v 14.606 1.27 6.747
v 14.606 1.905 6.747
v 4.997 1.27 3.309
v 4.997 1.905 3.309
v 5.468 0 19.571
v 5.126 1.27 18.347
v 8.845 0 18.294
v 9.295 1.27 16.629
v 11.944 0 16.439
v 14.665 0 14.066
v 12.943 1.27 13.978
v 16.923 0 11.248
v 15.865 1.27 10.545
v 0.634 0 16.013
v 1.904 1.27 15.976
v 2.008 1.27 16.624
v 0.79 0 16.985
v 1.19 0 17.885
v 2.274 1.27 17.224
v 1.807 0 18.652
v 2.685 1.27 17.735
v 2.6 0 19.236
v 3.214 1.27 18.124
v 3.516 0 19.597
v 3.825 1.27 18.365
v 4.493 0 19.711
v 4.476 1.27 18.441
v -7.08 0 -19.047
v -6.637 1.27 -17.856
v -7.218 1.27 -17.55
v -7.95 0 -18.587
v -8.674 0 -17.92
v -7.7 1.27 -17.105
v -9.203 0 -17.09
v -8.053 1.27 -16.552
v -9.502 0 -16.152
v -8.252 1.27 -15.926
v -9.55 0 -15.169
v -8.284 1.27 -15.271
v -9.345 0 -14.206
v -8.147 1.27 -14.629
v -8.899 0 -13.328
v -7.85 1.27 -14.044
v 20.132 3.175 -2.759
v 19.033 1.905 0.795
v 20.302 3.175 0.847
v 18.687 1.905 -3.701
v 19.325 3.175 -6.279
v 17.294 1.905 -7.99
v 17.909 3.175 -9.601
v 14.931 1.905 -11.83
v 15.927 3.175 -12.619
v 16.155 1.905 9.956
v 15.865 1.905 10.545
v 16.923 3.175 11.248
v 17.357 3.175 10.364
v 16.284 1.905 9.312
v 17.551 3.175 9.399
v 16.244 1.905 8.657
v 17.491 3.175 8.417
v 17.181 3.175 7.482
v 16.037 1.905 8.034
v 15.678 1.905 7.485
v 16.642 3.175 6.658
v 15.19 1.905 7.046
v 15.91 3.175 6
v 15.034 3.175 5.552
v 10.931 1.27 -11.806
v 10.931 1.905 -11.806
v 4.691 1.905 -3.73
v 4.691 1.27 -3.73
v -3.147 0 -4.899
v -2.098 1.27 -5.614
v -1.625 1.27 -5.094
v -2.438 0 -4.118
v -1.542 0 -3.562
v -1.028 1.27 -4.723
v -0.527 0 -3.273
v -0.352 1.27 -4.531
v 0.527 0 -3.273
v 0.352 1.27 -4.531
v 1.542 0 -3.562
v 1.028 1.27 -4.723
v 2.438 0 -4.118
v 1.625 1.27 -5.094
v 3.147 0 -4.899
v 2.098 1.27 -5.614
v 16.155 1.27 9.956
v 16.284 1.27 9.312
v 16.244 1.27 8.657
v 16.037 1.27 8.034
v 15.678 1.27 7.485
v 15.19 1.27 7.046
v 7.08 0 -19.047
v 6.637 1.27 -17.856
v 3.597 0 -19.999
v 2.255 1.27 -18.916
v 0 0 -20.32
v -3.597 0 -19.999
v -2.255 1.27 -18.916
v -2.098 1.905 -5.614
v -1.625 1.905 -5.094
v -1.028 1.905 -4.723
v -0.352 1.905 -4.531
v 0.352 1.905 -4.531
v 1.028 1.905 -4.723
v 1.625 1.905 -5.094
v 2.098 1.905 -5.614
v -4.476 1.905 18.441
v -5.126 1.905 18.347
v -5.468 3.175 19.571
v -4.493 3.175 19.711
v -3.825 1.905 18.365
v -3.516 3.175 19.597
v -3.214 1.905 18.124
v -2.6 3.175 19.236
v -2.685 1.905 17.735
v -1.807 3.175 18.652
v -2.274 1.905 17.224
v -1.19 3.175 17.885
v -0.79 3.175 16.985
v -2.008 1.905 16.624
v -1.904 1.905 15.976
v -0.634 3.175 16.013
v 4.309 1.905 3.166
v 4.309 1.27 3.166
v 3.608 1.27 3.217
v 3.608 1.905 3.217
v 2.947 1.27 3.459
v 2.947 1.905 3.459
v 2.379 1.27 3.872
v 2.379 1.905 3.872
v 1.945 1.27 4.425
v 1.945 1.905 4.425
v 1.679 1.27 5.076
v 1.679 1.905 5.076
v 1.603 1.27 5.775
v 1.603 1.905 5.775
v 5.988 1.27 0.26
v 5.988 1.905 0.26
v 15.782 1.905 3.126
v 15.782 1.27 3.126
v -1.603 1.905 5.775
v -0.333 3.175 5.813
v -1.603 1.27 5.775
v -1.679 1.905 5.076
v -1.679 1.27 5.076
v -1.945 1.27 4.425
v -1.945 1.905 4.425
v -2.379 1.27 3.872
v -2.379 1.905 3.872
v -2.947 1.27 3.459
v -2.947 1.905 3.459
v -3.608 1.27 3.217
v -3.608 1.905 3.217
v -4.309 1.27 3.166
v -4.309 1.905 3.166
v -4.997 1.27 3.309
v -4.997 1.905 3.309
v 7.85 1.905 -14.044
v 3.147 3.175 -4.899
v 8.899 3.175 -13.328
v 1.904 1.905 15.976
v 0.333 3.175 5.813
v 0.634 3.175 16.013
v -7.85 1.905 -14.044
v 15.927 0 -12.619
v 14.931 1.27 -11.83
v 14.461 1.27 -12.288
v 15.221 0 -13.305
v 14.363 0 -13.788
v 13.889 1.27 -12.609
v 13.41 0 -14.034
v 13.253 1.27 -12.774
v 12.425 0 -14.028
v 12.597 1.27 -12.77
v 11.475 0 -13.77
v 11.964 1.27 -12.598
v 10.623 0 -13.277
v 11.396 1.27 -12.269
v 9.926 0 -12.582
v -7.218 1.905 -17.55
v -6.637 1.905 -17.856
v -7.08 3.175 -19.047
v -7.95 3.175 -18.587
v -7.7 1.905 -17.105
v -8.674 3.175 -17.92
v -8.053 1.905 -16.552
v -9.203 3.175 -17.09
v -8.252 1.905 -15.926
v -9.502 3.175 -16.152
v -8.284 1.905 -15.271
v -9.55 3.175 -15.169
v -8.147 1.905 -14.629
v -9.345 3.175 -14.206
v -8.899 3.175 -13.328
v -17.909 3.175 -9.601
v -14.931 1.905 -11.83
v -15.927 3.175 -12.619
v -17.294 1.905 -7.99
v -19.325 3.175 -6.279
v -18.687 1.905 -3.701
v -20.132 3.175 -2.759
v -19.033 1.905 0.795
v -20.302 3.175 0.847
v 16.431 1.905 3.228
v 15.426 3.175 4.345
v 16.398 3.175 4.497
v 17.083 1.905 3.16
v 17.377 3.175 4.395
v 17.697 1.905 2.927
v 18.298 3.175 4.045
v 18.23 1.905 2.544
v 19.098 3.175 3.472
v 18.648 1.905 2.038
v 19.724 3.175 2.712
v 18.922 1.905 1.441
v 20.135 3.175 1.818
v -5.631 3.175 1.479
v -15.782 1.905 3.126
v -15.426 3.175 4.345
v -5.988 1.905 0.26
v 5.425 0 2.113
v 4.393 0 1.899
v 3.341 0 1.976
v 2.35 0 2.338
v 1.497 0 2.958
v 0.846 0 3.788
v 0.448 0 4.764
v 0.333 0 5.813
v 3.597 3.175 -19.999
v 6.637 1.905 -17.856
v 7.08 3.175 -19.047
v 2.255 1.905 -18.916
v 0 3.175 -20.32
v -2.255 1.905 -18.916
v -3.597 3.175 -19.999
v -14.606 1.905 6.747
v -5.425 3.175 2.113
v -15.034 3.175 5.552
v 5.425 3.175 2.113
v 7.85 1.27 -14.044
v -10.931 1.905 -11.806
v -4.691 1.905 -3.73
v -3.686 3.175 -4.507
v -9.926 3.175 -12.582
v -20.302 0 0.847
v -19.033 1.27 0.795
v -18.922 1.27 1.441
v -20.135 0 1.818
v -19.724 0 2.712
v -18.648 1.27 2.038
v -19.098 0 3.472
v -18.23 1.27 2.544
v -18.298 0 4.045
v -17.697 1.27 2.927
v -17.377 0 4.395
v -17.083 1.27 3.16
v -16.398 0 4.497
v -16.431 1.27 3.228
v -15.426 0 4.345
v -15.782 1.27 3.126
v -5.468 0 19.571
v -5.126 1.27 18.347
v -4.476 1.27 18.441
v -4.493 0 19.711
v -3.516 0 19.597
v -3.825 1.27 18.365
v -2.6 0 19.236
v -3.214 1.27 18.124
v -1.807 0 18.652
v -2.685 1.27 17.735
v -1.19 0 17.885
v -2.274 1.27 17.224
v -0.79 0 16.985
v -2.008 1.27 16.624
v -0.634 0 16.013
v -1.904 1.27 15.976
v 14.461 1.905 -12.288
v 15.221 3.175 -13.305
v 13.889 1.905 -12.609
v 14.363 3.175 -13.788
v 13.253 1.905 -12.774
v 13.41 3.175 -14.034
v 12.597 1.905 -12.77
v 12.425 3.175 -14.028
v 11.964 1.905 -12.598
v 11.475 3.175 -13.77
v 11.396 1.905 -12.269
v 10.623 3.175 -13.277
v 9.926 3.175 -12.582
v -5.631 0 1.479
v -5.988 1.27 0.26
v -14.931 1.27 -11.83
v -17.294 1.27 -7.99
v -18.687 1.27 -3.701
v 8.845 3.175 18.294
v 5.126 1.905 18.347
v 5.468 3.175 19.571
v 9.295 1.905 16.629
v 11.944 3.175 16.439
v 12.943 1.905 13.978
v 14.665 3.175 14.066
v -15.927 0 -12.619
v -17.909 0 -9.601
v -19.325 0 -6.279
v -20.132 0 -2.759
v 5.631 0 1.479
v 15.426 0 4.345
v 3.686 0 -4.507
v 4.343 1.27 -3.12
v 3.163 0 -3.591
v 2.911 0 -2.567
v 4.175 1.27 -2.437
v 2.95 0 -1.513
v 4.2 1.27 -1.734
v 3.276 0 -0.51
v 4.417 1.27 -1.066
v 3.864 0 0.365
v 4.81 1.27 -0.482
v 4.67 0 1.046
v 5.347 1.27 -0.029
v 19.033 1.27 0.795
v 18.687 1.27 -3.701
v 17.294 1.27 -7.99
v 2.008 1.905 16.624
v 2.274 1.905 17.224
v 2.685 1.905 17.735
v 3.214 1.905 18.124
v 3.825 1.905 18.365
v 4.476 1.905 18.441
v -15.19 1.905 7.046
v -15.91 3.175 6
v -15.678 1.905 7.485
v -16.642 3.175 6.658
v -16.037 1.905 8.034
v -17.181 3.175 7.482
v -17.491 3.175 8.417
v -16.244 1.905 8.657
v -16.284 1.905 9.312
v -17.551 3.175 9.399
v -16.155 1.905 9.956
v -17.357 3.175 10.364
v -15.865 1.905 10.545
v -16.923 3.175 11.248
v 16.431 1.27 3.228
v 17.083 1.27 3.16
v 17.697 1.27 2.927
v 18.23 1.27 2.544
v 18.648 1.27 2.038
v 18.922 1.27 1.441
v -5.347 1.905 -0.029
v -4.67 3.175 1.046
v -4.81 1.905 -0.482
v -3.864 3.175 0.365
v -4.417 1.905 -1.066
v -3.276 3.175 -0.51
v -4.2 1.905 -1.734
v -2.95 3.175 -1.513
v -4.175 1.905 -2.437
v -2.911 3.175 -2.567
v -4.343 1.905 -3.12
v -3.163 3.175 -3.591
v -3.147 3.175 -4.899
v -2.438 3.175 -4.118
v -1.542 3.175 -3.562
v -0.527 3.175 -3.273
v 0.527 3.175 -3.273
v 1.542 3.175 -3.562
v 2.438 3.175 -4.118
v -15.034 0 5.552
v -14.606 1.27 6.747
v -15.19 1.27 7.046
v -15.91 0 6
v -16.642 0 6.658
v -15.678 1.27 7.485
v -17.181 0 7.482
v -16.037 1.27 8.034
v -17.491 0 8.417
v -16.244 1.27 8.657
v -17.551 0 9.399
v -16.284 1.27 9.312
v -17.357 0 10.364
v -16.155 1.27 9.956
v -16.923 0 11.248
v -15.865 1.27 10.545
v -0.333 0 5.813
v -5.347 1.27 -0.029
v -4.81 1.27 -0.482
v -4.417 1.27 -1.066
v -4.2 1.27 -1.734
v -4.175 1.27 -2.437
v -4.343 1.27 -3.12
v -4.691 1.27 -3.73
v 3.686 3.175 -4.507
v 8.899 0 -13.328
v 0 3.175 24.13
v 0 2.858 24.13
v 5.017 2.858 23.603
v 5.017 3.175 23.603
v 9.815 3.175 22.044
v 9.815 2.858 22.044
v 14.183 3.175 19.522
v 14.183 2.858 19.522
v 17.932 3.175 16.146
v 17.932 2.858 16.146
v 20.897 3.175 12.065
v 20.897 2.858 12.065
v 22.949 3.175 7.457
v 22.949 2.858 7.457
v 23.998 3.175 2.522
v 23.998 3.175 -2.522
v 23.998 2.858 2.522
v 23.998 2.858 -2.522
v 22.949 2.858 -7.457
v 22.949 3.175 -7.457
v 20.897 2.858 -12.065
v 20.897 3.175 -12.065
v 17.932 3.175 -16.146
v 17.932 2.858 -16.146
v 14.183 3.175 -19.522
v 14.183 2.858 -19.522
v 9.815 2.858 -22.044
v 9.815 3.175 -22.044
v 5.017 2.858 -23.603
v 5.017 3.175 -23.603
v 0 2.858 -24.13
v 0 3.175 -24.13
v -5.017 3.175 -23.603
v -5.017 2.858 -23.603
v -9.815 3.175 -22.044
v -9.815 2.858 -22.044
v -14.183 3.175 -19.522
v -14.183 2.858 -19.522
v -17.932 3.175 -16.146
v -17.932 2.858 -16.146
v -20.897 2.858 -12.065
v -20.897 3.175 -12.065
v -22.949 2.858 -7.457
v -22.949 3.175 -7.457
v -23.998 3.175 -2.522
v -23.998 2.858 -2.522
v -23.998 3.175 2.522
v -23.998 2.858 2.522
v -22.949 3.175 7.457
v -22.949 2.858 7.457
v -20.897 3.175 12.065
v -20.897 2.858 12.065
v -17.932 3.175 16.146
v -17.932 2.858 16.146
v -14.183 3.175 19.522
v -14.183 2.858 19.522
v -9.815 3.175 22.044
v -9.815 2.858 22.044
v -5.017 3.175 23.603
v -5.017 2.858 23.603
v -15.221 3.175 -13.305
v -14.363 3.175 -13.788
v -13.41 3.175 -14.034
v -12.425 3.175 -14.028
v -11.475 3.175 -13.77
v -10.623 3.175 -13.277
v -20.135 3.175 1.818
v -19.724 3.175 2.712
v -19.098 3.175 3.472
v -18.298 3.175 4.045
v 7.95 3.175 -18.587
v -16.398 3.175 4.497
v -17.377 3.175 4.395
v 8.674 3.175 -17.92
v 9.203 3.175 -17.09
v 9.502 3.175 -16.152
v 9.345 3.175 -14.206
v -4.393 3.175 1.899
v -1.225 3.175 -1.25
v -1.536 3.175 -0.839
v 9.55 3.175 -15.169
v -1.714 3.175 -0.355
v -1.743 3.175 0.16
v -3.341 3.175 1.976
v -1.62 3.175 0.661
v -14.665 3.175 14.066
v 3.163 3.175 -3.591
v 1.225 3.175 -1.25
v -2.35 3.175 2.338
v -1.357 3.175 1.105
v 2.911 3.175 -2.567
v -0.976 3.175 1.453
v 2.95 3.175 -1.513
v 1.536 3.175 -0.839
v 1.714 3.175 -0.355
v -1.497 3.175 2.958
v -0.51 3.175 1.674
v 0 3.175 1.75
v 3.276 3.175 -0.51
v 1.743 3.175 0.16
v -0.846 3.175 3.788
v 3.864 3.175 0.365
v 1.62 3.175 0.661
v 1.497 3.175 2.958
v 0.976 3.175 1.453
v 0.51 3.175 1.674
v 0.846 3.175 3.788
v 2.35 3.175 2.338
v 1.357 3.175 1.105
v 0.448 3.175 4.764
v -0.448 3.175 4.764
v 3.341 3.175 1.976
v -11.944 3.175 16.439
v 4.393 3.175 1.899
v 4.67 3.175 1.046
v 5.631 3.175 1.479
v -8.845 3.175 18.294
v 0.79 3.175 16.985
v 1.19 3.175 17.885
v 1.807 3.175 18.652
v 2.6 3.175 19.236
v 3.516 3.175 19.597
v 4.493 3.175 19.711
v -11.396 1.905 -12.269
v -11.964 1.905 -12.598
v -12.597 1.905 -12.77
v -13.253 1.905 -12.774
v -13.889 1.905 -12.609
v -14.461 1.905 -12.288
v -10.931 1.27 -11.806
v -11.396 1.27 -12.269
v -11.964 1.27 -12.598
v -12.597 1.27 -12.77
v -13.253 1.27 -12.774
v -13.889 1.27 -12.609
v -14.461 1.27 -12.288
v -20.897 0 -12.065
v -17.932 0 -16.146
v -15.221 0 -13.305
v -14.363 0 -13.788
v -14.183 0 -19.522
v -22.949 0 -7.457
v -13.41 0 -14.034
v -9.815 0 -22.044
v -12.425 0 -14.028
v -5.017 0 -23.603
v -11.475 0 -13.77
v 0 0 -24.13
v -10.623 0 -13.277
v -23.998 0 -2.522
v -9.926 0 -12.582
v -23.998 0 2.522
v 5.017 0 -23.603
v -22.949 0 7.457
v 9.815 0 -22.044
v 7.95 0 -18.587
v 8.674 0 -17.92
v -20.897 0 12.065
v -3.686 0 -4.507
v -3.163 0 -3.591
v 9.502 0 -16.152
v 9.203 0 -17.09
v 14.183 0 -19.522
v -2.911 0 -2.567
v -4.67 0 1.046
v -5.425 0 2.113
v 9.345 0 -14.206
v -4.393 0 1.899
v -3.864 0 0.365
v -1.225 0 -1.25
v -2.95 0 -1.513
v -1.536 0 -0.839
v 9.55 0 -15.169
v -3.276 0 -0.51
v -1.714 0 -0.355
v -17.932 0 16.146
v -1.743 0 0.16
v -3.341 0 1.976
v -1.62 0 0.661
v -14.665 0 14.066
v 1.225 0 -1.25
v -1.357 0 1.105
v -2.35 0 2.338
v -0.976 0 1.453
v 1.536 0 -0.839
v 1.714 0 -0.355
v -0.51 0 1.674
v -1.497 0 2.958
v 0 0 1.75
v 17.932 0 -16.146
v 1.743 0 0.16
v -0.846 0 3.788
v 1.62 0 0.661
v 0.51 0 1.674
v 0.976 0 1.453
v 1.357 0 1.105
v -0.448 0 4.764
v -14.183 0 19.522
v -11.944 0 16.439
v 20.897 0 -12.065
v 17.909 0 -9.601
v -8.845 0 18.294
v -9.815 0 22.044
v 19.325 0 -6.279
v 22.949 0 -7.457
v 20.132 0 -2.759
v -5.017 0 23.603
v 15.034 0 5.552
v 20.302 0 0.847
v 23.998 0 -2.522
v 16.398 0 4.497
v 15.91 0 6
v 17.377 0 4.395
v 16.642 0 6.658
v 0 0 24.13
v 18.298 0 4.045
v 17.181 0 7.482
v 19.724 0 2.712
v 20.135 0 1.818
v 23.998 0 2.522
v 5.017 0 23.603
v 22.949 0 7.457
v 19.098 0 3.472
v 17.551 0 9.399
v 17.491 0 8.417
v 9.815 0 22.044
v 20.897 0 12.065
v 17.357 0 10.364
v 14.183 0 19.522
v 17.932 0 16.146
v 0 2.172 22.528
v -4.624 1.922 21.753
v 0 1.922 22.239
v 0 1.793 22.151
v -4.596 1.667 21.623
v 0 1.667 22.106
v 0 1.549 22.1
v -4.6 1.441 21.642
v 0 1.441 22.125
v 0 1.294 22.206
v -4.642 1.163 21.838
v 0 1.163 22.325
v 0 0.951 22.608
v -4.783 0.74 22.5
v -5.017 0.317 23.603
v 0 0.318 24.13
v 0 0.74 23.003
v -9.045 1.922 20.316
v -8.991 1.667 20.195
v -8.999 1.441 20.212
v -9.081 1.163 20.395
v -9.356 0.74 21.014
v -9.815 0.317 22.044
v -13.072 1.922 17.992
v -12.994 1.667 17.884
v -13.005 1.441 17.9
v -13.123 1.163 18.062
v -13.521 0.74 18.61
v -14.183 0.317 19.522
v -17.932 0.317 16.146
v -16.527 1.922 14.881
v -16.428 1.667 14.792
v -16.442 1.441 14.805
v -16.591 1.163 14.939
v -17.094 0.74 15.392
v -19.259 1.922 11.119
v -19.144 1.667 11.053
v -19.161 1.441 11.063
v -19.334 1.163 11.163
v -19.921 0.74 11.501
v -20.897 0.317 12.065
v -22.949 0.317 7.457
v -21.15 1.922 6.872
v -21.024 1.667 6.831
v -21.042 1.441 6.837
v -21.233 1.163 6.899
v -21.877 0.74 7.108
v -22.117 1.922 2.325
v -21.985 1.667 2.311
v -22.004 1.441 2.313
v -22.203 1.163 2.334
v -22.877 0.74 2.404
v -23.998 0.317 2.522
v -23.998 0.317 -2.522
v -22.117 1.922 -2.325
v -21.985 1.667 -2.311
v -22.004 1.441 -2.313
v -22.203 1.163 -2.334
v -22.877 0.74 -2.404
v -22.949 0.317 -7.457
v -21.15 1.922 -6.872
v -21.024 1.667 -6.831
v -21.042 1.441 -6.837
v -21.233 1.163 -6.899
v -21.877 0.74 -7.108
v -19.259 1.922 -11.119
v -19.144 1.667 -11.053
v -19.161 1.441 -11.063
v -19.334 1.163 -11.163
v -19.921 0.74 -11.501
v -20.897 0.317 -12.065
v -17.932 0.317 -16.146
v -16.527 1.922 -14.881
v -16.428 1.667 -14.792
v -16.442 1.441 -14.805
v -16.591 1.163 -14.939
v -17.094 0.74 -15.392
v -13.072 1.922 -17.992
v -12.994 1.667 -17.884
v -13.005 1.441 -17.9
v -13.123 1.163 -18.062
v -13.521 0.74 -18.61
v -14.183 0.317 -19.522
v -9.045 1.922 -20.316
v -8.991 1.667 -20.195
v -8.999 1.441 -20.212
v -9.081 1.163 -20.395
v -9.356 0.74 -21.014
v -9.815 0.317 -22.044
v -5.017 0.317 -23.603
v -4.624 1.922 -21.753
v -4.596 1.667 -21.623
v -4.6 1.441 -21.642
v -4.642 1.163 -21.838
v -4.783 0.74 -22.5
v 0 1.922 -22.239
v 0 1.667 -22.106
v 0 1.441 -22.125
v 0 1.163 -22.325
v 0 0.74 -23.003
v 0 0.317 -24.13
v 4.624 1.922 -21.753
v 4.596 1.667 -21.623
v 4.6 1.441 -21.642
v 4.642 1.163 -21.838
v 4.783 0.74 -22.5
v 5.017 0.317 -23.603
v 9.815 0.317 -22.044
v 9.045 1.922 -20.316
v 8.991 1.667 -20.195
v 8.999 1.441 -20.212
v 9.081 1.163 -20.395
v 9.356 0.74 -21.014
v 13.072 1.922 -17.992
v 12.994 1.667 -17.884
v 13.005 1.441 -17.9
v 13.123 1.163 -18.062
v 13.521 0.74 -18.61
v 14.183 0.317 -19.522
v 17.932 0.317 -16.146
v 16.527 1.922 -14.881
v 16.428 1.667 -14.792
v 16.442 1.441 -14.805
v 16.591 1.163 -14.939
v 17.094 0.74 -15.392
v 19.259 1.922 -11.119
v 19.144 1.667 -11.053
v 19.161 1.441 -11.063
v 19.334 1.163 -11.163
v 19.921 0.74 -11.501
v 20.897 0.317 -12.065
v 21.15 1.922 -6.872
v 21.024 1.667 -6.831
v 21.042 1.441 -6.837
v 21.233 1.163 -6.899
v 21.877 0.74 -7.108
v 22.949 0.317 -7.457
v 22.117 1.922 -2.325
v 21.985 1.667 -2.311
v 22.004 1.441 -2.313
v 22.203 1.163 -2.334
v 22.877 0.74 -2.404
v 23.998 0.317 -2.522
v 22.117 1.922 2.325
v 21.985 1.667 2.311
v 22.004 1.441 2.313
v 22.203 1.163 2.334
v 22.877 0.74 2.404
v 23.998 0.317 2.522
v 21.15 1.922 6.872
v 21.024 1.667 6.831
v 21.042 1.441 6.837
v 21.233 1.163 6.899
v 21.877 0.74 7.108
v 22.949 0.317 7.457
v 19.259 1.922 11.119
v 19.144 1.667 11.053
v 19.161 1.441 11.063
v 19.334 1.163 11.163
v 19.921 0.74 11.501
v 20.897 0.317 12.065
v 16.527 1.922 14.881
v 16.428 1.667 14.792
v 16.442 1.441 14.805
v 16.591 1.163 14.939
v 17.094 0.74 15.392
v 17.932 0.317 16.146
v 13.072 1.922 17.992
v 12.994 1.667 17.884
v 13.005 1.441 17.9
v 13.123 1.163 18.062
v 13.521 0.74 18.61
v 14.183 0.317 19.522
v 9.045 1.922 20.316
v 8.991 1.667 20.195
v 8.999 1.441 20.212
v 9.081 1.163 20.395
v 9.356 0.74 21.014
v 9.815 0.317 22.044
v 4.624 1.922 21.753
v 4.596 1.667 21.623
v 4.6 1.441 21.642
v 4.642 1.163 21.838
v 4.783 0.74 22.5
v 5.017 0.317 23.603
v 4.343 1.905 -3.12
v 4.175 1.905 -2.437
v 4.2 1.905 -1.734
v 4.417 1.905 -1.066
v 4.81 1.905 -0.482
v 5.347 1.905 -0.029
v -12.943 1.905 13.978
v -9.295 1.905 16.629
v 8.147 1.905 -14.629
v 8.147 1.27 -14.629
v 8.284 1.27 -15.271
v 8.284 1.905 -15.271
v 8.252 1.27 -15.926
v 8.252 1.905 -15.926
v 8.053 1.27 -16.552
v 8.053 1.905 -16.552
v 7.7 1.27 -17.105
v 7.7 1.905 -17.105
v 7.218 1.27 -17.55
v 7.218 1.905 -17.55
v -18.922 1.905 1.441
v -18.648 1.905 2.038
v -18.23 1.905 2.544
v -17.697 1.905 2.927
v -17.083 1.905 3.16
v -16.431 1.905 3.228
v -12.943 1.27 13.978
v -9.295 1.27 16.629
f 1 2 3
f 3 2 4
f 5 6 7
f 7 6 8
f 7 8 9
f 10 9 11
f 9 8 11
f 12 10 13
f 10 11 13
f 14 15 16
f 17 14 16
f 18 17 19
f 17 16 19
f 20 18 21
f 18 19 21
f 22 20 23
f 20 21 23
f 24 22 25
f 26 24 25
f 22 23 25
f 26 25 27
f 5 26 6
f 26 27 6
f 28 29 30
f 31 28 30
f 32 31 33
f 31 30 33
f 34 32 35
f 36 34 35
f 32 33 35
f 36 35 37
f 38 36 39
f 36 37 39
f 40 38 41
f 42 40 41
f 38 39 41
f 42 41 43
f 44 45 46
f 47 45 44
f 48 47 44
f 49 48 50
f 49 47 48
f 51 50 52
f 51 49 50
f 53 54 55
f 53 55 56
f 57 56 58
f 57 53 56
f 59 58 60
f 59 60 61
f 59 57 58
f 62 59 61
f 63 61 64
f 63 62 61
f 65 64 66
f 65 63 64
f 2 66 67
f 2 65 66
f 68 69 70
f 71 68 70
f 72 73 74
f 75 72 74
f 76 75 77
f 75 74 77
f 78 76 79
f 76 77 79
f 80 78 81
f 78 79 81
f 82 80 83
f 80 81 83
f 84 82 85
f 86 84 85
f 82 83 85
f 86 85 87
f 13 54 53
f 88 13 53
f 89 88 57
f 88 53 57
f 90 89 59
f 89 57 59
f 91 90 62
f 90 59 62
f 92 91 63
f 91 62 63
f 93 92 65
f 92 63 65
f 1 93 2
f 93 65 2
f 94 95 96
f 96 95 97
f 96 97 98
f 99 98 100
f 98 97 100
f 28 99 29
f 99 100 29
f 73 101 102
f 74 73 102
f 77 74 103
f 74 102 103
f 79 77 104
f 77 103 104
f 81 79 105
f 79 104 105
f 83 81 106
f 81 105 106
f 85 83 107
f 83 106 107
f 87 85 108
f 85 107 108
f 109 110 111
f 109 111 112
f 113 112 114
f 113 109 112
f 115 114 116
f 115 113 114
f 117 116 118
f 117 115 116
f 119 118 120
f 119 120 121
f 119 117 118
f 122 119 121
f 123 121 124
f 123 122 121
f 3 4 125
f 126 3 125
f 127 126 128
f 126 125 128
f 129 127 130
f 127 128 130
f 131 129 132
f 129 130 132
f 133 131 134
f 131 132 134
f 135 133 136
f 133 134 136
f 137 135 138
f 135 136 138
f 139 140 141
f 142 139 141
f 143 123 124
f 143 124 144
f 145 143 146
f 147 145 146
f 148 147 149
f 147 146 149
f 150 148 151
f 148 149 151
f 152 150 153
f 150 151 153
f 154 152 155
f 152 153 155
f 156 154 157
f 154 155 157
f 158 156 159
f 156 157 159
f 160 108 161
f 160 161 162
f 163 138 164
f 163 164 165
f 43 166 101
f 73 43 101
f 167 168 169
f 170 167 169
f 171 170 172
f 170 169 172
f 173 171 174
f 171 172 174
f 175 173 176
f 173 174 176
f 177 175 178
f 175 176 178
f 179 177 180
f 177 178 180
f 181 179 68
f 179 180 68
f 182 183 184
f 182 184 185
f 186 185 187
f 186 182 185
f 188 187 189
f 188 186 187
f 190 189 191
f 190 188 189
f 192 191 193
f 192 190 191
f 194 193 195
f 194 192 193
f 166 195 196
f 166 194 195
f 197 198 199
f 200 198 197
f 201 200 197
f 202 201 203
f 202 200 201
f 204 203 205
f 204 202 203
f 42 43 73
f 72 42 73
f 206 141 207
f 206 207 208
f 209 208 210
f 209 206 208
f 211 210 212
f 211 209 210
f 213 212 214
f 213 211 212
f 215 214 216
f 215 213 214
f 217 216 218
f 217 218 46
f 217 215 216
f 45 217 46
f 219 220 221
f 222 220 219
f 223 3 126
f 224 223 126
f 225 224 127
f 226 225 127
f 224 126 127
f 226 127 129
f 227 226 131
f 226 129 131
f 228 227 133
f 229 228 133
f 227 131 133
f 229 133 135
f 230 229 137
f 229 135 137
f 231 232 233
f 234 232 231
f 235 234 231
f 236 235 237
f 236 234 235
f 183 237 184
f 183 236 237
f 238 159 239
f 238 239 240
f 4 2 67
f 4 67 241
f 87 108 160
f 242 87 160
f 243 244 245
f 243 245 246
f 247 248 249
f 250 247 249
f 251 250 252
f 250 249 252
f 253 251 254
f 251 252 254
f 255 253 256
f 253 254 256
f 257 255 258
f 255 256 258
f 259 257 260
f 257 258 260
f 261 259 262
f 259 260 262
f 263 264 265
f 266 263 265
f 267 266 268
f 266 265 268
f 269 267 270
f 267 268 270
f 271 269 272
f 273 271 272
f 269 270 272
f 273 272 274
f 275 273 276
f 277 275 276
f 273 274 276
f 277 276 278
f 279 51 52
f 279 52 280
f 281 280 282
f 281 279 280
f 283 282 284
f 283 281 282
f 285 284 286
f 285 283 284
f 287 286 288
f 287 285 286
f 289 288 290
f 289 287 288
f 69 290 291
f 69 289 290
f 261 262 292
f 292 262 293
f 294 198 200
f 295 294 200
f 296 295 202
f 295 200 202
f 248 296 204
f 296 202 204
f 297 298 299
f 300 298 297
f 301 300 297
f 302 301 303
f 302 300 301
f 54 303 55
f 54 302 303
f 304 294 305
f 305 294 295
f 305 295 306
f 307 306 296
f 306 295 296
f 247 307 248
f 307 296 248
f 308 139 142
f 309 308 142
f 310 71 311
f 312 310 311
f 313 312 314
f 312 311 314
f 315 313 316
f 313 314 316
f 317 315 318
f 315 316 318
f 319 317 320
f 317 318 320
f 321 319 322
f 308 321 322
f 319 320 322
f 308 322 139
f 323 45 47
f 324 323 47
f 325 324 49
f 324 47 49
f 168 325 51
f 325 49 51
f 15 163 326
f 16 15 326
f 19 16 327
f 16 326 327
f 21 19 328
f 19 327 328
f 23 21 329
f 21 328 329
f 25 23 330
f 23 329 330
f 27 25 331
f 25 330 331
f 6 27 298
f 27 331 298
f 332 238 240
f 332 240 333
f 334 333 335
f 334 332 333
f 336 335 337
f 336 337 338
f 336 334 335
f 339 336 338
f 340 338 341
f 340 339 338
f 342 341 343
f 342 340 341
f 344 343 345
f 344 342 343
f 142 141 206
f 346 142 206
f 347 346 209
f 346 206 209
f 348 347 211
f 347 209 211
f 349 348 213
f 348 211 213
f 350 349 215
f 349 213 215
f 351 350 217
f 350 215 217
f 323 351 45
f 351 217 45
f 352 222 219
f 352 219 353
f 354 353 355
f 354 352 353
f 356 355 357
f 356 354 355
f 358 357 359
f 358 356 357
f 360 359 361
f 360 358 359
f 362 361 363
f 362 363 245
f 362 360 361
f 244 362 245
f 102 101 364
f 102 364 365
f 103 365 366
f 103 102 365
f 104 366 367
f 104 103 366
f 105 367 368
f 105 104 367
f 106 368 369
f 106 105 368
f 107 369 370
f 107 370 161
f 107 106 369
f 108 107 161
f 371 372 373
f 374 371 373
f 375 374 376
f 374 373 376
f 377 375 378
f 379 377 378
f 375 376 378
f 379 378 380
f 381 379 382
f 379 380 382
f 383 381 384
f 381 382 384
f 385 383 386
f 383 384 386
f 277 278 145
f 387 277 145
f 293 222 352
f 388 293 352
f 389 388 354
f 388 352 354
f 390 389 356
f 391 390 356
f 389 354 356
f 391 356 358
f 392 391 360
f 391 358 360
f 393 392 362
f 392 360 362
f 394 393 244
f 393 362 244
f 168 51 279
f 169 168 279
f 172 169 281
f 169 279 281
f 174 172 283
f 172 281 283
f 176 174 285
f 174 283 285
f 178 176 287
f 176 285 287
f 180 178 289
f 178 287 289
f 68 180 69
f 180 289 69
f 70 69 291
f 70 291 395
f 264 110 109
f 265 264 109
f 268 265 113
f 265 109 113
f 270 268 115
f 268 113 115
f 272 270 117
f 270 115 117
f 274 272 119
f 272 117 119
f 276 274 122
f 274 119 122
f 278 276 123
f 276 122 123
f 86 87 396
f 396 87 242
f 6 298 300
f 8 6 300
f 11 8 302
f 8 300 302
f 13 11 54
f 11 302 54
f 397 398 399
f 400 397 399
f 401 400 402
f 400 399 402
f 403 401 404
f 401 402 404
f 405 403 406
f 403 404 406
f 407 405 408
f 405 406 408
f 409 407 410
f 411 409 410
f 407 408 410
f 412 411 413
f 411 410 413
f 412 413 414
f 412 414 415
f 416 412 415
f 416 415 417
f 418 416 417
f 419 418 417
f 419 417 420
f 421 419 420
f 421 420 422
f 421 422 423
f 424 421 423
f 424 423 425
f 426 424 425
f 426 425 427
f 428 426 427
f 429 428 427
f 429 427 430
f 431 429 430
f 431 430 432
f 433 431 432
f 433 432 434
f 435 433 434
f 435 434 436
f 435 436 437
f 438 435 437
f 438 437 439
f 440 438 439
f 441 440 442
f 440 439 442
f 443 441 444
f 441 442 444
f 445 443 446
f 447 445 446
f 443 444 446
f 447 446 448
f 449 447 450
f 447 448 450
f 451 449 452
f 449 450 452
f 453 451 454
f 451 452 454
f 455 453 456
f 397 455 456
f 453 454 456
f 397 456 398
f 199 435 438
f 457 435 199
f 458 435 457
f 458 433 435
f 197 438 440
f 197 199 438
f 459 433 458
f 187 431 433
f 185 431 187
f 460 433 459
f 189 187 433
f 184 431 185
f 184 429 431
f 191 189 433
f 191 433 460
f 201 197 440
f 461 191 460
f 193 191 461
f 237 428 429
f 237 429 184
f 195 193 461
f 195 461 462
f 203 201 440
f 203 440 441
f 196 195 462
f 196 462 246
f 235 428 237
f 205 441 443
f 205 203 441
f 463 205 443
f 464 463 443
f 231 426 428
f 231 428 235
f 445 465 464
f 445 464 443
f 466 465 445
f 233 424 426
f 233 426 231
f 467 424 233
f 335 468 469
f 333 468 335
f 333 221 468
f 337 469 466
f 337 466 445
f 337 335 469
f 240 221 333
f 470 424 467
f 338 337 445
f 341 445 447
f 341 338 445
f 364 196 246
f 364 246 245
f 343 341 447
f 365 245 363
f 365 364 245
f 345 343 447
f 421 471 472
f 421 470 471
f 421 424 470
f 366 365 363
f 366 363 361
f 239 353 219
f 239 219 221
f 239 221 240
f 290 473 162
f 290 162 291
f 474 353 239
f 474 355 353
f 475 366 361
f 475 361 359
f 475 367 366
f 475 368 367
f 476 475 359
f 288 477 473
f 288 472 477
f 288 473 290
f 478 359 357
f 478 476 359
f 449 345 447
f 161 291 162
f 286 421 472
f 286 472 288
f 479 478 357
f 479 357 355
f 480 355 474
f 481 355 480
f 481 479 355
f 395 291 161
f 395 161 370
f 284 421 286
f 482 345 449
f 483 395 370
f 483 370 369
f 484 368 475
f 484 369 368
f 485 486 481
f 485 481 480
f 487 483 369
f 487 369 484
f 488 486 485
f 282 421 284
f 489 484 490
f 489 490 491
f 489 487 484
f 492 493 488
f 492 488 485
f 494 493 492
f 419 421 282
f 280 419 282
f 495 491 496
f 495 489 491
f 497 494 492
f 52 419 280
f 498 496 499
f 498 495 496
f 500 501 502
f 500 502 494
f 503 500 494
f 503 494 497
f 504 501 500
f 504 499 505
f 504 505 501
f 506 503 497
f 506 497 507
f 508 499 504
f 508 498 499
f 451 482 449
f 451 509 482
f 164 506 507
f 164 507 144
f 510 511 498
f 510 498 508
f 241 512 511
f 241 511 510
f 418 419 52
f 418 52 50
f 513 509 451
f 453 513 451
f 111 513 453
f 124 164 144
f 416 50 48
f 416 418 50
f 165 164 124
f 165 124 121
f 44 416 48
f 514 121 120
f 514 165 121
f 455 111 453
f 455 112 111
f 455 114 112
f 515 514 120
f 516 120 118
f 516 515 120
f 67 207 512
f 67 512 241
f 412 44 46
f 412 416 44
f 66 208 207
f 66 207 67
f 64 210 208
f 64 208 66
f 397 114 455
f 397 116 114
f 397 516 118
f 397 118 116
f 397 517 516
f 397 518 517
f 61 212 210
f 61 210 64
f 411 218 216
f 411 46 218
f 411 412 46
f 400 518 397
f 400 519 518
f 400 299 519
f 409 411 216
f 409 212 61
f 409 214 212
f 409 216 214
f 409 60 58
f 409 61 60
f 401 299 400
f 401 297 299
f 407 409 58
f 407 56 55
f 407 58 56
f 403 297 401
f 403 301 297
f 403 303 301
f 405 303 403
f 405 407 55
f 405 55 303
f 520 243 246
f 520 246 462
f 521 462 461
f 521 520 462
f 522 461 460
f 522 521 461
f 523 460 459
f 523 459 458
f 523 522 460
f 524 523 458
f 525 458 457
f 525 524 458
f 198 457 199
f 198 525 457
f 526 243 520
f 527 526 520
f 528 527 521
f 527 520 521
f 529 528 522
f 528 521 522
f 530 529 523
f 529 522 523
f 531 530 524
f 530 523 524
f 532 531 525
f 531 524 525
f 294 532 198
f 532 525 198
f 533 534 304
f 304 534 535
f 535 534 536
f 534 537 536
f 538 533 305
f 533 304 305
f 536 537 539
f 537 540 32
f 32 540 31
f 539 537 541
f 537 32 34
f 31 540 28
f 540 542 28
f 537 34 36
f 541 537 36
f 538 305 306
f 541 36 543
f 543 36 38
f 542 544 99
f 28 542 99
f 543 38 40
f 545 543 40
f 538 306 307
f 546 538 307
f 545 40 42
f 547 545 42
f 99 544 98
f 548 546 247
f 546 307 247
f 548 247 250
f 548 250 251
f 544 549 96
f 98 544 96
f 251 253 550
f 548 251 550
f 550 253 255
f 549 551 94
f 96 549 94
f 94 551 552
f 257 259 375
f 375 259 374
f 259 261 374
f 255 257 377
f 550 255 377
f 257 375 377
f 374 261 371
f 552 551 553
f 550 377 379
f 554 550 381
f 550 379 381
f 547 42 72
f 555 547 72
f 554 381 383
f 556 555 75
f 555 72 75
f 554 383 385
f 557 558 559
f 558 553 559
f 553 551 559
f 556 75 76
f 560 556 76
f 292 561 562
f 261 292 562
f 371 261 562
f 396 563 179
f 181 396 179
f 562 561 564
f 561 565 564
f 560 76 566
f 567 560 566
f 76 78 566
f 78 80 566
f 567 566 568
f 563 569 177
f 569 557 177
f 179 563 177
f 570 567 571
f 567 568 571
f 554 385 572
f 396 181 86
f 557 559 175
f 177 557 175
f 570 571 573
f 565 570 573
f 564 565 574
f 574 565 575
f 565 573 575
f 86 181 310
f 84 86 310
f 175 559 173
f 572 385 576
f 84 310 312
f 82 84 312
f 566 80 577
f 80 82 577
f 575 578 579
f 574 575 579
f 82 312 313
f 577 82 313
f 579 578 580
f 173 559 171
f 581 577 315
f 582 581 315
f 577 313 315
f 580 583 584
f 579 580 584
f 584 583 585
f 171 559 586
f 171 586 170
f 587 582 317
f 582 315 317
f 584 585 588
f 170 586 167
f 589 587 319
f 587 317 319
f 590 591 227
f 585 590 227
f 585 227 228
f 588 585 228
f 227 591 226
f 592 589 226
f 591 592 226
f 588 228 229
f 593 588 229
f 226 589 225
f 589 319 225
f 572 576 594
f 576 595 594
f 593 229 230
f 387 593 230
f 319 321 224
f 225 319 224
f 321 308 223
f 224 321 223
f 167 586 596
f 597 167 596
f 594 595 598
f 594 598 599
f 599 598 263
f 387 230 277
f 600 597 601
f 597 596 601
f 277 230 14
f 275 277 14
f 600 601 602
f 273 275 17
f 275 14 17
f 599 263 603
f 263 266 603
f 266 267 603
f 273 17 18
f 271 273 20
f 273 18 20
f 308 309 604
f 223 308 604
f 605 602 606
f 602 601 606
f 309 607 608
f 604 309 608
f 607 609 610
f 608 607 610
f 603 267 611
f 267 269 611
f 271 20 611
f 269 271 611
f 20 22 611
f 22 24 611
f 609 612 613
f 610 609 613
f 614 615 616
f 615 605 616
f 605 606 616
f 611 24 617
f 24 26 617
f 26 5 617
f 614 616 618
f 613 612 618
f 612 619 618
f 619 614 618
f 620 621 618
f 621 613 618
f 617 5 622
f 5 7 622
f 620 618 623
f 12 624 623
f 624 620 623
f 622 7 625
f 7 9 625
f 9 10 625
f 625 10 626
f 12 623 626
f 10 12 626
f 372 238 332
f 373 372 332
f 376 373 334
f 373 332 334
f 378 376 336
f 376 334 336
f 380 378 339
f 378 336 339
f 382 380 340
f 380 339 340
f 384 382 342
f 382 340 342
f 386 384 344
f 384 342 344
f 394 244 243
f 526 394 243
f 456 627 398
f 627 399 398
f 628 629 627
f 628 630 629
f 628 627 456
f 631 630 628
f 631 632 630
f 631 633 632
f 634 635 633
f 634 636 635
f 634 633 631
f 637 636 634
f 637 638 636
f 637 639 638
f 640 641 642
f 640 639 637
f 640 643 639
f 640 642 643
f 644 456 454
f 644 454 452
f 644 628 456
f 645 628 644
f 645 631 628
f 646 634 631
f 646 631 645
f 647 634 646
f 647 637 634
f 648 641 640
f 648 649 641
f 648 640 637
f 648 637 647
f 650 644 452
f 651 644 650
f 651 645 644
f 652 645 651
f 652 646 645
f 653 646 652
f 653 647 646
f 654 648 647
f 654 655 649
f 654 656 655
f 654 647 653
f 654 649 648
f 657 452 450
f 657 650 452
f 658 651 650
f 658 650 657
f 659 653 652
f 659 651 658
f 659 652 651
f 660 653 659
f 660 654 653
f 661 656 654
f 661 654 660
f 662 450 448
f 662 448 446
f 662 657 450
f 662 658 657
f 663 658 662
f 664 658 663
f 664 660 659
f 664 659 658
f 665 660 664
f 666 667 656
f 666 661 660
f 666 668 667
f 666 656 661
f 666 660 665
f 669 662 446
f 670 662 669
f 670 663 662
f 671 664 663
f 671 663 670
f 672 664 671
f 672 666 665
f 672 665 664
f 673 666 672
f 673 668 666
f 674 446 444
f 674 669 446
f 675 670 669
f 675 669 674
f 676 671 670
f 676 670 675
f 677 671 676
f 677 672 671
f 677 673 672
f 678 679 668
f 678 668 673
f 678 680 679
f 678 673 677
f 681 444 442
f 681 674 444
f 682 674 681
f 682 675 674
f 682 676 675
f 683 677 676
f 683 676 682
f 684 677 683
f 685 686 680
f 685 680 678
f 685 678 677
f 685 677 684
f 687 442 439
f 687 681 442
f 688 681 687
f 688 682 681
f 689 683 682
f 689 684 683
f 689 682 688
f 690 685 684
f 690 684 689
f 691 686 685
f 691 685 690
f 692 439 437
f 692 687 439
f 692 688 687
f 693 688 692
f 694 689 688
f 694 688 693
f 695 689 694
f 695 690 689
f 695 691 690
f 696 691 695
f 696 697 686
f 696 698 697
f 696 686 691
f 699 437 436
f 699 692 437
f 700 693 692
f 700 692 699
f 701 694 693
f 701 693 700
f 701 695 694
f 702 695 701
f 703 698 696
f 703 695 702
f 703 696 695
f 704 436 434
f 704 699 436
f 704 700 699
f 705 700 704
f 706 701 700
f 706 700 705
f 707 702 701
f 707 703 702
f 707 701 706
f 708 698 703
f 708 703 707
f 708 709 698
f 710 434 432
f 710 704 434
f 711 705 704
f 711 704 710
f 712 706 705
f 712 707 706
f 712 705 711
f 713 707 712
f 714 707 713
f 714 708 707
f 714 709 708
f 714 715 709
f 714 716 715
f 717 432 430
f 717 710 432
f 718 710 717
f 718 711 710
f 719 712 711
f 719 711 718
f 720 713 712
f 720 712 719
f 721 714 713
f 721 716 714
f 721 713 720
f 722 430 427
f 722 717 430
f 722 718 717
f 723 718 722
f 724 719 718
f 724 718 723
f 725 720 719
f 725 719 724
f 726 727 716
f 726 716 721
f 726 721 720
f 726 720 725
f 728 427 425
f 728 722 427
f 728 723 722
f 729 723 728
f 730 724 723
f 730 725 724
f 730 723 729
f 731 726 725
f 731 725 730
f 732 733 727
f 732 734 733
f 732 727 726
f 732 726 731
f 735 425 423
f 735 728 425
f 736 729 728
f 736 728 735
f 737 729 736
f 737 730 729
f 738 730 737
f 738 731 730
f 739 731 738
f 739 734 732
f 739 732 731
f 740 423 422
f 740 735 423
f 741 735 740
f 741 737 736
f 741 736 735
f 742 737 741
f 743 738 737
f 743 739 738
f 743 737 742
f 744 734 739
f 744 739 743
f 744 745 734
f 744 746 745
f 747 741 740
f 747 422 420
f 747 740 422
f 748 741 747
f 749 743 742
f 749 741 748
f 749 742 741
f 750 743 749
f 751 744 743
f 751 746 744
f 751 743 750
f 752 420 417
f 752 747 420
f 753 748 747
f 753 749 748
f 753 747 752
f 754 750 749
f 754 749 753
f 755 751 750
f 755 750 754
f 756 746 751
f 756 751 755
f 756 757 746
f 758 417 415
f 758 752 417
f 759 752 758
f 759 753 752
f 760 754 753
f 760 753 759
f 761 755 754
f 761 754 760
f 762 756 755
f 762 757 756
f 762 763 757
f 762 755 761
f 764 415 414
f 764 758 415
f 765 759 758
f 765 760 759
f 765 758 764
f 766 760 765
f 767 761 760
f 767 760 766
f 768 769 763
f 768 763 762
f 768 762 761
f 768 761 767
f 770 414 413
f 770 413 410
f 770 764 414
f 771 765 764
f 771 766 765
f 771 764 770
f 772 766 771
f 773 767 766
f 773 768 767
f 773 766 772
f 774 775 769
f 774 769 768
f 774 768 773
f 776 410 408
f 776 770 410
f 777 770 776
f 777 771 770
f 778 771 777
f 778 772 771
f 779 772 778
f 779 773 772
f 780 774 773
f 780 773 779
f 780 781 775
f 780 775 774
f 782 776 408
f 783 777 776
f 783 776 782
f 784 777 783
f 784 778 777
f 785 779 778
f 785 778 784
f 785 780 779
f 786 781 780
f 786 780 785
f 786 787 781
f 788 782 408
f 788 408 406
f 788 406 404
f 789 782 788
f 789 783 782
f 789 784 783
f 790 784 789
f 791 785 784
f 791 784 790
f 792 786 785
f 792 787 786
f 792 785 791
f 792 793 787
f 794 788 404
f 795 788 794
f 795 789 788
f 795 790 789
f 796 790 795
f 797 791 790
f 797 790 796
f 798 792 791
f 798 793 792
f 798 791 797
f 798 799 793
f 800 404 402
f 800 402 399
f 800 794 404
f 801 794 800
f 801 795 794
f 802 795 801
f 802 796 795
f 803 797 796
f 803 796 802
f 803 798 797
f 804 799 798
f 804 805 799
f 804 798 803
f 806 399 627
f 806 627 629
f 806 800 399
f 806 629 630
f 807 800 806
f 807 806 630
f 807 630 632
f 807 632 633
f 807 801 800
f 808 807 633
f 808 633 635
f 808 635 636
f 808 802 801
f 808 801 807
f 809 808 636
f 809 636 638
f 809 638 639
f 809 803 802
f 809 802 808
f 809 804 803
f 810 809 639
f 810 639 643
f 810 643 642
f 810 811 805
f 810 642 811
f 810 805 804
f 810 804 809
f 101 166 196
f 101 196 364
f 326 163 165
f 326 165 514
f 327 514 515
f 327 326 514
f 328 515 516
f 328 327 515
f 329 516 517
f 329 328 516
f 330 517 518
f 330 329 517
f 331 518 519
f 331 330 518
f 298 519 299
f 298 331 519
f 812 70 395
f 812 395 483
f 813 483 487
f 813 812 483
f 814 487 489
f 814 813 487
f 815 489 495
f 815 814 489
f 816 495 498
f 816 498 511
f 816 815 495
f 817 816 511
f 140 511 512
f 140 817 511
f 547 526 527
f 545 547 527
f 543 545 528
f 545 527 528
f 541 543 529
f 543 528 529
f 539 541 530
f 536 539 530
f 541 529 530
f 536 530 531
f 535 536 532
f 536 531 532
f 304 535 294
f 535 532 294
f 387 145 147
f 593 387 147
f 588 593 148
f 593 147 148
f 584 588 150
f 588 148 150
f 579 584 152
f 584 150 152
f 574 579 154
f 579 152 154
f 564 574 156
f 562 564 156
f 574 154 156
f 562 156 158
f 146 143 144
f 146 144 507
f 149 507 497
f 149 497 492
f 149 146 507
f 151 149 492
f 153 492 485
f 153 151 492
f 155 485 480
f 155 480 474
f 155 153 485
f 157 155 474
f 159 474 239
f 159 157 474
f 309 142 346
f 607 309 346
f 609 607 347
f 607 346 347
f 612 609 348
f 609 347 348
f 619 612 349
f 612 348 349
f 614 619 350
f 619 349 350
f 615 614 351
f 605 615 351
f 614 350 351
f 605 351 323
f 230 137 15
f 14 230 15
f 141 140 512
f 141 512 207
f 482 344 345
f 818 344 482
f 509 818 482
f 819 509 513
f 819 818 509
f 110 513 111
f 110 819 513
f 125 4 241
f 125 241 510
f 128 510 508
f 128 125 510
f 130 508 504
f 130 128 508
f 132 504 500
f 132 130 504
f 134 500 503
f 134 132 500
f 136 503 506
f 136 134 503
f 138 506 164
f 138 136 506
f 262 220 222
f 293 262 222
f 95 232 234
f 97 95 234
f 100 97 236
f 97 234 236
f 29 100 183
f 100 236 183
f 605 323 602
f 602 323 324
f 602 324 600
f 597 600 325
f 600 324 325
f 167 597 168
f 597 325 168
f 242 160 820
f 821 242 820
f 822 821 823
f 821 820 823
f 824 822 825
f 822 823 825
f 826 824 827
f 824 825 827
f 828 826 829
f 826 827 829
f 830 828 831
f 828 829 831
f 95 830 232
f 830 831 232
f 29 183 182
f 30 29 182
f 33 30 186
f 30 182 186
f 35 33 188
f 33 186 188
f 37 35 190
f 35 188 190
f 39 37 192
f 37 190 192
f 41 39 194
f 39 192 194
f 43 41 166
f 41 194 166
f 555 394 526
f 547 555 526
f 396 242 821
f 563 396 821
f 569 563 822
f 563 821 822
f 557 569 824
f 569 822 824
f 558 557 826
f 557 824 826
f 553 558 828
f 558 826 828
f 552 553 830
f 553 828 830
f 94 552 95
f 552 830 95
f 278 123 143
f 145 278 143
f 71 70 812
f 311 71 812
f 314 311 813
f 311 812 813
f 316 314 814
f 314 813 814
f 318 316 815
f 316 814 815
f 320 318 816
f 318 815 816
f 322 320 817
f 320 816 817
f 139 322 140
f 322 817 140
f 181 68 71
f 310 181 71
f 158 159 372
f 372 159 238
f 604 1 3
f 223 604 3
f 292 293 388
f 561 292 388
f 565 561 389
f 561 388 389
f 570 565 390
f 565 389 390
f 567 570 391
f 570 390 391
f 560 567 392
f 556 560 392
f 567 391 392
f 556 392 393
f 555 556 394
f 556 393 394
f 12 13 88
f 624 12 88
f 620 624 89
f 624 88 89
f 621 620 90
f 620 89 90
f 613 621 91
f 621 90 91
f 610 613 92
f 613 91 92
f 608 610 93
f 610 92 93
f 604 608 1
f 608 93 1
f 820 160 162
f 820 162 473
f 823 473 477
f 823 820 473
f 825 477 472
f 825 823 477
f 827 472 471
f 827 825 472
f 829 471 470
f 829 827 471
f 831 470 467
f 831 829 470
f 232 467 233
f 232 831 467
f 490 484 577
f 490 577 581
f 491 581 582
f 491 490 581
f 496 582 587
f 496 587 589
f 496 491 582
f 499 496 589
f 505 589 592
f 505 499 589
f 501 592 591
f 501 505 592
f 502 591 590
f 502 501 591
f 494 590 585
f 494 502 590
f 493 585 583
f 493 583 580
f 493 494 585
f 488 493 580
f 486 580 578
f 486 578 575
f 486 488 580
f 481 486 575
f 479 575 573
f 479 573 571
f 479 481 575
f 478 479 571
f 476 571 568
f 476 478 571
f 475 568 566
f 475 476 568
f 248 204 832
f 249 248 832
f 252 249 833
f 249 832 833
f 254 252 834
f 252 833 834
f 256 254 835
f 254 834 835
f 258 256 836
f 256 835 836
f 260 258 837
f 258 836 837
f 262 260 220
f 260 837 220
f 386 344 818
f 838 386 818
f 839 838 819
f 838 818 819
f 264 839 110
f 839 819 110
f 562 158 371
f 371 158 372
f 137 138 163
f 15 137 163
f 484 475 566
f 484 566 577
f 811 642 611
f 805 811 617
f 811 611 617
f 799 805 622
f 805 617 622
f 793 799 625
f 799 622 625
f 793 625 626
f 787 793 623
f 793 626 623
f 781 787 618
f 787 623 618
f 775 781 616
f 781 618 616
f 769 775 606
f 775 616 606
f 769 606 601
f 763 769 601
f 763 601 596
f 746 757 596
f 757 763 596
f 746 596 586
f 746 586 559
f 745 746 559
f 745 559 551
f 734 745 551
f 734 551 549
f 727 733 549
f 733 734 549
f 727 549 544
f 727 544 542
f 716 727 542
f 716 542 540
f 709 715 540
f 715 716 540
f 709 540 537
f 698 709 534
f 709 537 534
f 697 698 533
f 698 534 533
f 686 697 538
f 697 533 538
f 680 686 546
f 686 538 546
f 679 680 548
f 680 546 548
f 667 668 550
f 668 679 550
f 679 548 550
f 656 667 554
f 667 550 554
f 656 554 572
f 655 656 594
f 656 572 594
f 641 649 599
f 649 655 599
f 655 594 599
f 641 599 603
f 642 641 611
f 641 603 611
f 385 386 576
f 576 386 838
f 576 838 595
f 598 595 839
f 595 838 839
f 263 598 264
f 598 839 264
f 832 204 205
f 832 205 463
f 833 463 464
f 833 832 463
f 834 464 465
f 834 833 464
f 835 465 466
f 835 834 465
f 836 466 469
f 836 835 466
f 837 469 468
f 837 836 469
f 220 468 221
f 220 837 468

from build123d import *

# Parameters (mm, degrees)
SKETCH1_R           = 24.13
BOSS_EXTRUDE1_DEPTH = 3.175
CUT_EXTRUDE2_DEPTH  = 35.272356572
CHAMFER2_SIZE       = 1.27
CUT_EXTRUDE4_DEPTH  = 3.175


with BuildPart() as part:
    # Sketch1 → Boss-Extrude1 (new body)
    with BuildSketch(Plane(origin=(0, 0, 0), x_dir=(1, 0, 0), z_dir=(0, 1, 0))):
        with Locations(Location((0, 0, 0), (0, 0, 270))):
            Circle(SKETCH1_R)
    extrude(amount=BOSS_EXTRUDE1_DEPTH)

    # Sketch3 → Cut-Extrude2 (cut, through all)
    with BuildSketch(Plane(origin=(0, 3.175, 0), x_dir=(1, 0, 0), z_dir=(0, 1, 0))):
        with BuildLine():
            Line((-7.850343046, 14.0437682), (-2.098034552, 5.614426559))
            ThreePointArc((-2.098034552, 5.614426559), (0, 4.506156638), (2.098034552, 5.614426559))
            Line((2.098034552, 5.614426559), (7.850343046, 14.0437682))
            ThreePointArc((7.850343046, 14.0437682), (8.172745173, 16.245619231), (6.637279032, 17.856344168))
            ThreePointArc((6.637279032, 17.856344168), (0, 19.05), (-6.637279032, 17.856344168))
            ThreePointArc((-6.637279032, 17.856344168), (-8.172745173, 16.245619231), (-7.850343046, 14.0437682))
        make_face()
        with BuildLine():
            Line((10.930527847, 11.805882948), (4.691308633, 3.730302652))
            ThreePointArc((4.691308633, 3.730302652), (4.285609634, 1.392478981), (5.987965296, -0.260396211))
            Line((5.987965296, -0.260396211), (15.782306673, -3.12635687))
            ThreePointArc((15.782306673, -3.12635687), (17.976019181, -2.752570127), (19.033424496, -0.794513668))
            ThreePointArc((19.033424496, -0.794513668), (18.117626635, 5.886773743), (14.931360461, 11.830341279))
            ThreePointArc((14.931360461, 11.830341279), (12.924984882, 12.79291498), (10.930527847, 11.805882948))
        make_face()
        with BuildLine():
            Line((14.60578077, -6.747331271), (4.997422739, -3.308972732))
            ThreePointArc((4.997422739, -3.308972732), (2.648652417, -3.6455573), (1.602731524, -5.775360269))
            Line((1.602731524, -5.775360269), (1.903658899, -15.975963007))
            ThreePointArc((1.903658899, -15.975963007), (2.937045662, -17.946801126), (5.126024229, -18.34738062))
            ThreePointArc((5.126024229, -18.34738062), (11.197309056, -15.411773743), (15.865367295, -10.544791159))
            ThreePointArc((15.865367295, -10.544791159), (16.160825135, -8.339162959), (14.60578077, -6.747331271))
        make_face()
        with BuildLine():
            Line((-1.903658899, -15.975963007), (-1.602731524, -5.775360269))
            ThreePointArc((-1.602731524, -5.775360269), (-2.648652417, -3.6455573), (-4.997422739, -3.308972732))
            Line((-4.997422739, -3.308972732), (-14.60578077, -6.747331271))
            ThreePointArc((-14.60578077, -6.747331271), (-16.160825135, -8.339162959), (-15.865367295, -10.544791159))
            ThreePointArc((-15.865367295, -10.544791159), (-11.197309056, -15.411773743), (-5.126024229, -18.34738062))
            ThreePointArc((-5.126024229, -18.34738062), (-2.937045662, -17.946801126), (-1.903658899, -15.975963007))
        make_face()
        with BuildLine():
            Line((-15.782306673, -3.12635687), (-5.987965296, -0.260396211))
            ThreePointArc((-5.987965296, -0.260396211), (-4.285609634, 1.392478981), (-4.691308633, 3.730302652))
            Line((-4.691308633, 3.730302652), (-10.930527847, 11.805882948))
            ThreePointArc((-10.930527847, 11.805882948), (-12.924984882, 12.79291498), (-14.931360461, 11.830341279))
            ThreePointArc((-14.931360461, 11.830341279), (-18.117626635, 5.886773743), (-19.033424496, -0.794513668))
            ThreePointArc((-19.033424496, -0.794513668), (-17.976019181, -2.752570127), (-15.782306673, -3.12635687))
        make_face()
    extrude(amount=-CUT_EXTRUDE2_DEPTH, mode=Mode.SUBTRACT)

    # Chamfer2
    chamfer2_edges = [part.edges().sort_by_distance(p)[0] for p in [
        (0, 0, -4.506156638),
        (-4.974188799, 0, -9.82909738),
        (-8.172745173, 0, -16.245619231),
        (0, 0, -19.05),
        (8.172745173, 0, -16.245619231),
        (4.974188799, 0, -9.82909738),
        (0, 3.175, -4.506156638),
        (4.974188799, 3.175, -9.82909738),
        (8.172745173, 3.175, -16.245619231),
        (0, 3.175, -19.05),
        (-8.172745173, 3.175, -16.245619231),
        (-4.974188799, 3.175, -9.82909738),
        (4.285609634, 0, -1.392478981),
        (7.81091824, 0, -7.7680928),
        (12.924984882, 0, -12.79291498),
        (18.117626635, 0, -5.886773743),
        (17.976019181, 0, 2.752570127),
        (10.885135984, 0, 1.693376541),
        (4.285609634, 3.175, -1.392478981),
        (10.885135984, 3.175, 1.693376541),
        (17.976019181, 3.175, 2.752570127),
        (18.117626635, 3.175, -5.886773743),
        (12.924984882, 3.175, -12.79291498),
        (7.81091824, 3.175, -7.7680928),
        (2.648652417, 0, 3.6455573),
        (9.801601755, 0, 5.028152001),
        (16.160825135, 0, 8.339162959),
        (11.197309056, 0, 15.411773743),
        (2.937045662, 0, 17.946801126),
        (1.753195212, 0, 10.875661638),
        (2.648652417, 3.175, 3.6455573),
        (1.753195212, 3.175, 10.875661638),
        (2.937045662, 3.175, 17.946801126),
        (11.197309056, 3.175, 15.411773743),
        (16.160825135, 3.175, 8.339162959),
        (9.801601755, 3.175, 5.028152001),
        (-2.648652417, 0, 3.6455573),
        (-1.753195212, 0, 10.875661638),
        (-2.937045662, 0, 17.946801126),
        (-11.197309056, 0, 15.411773743),
        (-16.160825135, 0, 8.339162959),
        (-9.801601755, 0, 5.028152001),
        (-2.648652417, 3.175, 3.6455573),
        (-9.801601755, 3.175, 5.028152001),
        (-16.160825135, 3.175, 8.339162959),
        (-11.197309056, 3.175, 15.411773743),
        (-2.937045662, 3.175, 17.946801126),
        (-1.753195212, 3.175, 10.875661638),
        (-4.285609634, 0, -1.392478981),
        (-10.885135984, 0, 1.693376541),
        (-17.976019181, 0, 2.752570127),
        (-18.117626635, 0, -5.886773743),
        (-12.924984882, 0, -12.79291498),
        (-7.81091824, 0, -7.7680928),
        (-4.285609634, 3.175, -1.392478981),
        (-7.81091824, 3.175, -7.7680928),
        (-12.924984882, 3.175, -12.79291498),
        (-18.117626635, 3.175, -5.886773743),
        (-17.976019181, 3.175, 2.752570127),
        (-10.885135984, 3.175, 1.693376541),
    ]]
    chamfer(chamfer2_edges, length=CHAMFER2_SIZE)

    # Sketch6 → Cut-Revolve3 (revolve, cut)
    with BuildSketch(Plane(origin=(0, 0, 0), x_dir=(0, 0, -1), z_dir=(1, 0, 0))):
        with BuildLine():
            Line((-24.13, 2.8575), (-24.13, 0.3175))
            add(Edge.make_bspline(
                [(-24.13, 2.8575), (-20.066, 1.5875), (-24.13, 0.3175)],
                knots=[0, 0, 0, 1, 1, 1], degree=2))
        make_face()
    revolve(axis=Axis((0, 5.876661269, 0), (0, -1, 0)), mode=Mode.SUBTRACT)

    # Sketch2 → Cut-Extrude4 (cut)
    with BuildSketch(Plane(origin=(0, 3.175, 0), x_dir=(1, 0, 0), z_dir=(0, 1, 0))):
        with BuildLine():
            Line((-1.224744914, 1.250000048), (1.224744914, 1.250000048))
            ThreePointArc((1.224744914, 1.250000048), (0, -1.750000064), (-1.224744914, 1.250000048))
        make_face()
    extrude(amount=-CUT_EXTRUDE4_DEPTH, mode=Mode.SUBTRACT)


solid = part.part
